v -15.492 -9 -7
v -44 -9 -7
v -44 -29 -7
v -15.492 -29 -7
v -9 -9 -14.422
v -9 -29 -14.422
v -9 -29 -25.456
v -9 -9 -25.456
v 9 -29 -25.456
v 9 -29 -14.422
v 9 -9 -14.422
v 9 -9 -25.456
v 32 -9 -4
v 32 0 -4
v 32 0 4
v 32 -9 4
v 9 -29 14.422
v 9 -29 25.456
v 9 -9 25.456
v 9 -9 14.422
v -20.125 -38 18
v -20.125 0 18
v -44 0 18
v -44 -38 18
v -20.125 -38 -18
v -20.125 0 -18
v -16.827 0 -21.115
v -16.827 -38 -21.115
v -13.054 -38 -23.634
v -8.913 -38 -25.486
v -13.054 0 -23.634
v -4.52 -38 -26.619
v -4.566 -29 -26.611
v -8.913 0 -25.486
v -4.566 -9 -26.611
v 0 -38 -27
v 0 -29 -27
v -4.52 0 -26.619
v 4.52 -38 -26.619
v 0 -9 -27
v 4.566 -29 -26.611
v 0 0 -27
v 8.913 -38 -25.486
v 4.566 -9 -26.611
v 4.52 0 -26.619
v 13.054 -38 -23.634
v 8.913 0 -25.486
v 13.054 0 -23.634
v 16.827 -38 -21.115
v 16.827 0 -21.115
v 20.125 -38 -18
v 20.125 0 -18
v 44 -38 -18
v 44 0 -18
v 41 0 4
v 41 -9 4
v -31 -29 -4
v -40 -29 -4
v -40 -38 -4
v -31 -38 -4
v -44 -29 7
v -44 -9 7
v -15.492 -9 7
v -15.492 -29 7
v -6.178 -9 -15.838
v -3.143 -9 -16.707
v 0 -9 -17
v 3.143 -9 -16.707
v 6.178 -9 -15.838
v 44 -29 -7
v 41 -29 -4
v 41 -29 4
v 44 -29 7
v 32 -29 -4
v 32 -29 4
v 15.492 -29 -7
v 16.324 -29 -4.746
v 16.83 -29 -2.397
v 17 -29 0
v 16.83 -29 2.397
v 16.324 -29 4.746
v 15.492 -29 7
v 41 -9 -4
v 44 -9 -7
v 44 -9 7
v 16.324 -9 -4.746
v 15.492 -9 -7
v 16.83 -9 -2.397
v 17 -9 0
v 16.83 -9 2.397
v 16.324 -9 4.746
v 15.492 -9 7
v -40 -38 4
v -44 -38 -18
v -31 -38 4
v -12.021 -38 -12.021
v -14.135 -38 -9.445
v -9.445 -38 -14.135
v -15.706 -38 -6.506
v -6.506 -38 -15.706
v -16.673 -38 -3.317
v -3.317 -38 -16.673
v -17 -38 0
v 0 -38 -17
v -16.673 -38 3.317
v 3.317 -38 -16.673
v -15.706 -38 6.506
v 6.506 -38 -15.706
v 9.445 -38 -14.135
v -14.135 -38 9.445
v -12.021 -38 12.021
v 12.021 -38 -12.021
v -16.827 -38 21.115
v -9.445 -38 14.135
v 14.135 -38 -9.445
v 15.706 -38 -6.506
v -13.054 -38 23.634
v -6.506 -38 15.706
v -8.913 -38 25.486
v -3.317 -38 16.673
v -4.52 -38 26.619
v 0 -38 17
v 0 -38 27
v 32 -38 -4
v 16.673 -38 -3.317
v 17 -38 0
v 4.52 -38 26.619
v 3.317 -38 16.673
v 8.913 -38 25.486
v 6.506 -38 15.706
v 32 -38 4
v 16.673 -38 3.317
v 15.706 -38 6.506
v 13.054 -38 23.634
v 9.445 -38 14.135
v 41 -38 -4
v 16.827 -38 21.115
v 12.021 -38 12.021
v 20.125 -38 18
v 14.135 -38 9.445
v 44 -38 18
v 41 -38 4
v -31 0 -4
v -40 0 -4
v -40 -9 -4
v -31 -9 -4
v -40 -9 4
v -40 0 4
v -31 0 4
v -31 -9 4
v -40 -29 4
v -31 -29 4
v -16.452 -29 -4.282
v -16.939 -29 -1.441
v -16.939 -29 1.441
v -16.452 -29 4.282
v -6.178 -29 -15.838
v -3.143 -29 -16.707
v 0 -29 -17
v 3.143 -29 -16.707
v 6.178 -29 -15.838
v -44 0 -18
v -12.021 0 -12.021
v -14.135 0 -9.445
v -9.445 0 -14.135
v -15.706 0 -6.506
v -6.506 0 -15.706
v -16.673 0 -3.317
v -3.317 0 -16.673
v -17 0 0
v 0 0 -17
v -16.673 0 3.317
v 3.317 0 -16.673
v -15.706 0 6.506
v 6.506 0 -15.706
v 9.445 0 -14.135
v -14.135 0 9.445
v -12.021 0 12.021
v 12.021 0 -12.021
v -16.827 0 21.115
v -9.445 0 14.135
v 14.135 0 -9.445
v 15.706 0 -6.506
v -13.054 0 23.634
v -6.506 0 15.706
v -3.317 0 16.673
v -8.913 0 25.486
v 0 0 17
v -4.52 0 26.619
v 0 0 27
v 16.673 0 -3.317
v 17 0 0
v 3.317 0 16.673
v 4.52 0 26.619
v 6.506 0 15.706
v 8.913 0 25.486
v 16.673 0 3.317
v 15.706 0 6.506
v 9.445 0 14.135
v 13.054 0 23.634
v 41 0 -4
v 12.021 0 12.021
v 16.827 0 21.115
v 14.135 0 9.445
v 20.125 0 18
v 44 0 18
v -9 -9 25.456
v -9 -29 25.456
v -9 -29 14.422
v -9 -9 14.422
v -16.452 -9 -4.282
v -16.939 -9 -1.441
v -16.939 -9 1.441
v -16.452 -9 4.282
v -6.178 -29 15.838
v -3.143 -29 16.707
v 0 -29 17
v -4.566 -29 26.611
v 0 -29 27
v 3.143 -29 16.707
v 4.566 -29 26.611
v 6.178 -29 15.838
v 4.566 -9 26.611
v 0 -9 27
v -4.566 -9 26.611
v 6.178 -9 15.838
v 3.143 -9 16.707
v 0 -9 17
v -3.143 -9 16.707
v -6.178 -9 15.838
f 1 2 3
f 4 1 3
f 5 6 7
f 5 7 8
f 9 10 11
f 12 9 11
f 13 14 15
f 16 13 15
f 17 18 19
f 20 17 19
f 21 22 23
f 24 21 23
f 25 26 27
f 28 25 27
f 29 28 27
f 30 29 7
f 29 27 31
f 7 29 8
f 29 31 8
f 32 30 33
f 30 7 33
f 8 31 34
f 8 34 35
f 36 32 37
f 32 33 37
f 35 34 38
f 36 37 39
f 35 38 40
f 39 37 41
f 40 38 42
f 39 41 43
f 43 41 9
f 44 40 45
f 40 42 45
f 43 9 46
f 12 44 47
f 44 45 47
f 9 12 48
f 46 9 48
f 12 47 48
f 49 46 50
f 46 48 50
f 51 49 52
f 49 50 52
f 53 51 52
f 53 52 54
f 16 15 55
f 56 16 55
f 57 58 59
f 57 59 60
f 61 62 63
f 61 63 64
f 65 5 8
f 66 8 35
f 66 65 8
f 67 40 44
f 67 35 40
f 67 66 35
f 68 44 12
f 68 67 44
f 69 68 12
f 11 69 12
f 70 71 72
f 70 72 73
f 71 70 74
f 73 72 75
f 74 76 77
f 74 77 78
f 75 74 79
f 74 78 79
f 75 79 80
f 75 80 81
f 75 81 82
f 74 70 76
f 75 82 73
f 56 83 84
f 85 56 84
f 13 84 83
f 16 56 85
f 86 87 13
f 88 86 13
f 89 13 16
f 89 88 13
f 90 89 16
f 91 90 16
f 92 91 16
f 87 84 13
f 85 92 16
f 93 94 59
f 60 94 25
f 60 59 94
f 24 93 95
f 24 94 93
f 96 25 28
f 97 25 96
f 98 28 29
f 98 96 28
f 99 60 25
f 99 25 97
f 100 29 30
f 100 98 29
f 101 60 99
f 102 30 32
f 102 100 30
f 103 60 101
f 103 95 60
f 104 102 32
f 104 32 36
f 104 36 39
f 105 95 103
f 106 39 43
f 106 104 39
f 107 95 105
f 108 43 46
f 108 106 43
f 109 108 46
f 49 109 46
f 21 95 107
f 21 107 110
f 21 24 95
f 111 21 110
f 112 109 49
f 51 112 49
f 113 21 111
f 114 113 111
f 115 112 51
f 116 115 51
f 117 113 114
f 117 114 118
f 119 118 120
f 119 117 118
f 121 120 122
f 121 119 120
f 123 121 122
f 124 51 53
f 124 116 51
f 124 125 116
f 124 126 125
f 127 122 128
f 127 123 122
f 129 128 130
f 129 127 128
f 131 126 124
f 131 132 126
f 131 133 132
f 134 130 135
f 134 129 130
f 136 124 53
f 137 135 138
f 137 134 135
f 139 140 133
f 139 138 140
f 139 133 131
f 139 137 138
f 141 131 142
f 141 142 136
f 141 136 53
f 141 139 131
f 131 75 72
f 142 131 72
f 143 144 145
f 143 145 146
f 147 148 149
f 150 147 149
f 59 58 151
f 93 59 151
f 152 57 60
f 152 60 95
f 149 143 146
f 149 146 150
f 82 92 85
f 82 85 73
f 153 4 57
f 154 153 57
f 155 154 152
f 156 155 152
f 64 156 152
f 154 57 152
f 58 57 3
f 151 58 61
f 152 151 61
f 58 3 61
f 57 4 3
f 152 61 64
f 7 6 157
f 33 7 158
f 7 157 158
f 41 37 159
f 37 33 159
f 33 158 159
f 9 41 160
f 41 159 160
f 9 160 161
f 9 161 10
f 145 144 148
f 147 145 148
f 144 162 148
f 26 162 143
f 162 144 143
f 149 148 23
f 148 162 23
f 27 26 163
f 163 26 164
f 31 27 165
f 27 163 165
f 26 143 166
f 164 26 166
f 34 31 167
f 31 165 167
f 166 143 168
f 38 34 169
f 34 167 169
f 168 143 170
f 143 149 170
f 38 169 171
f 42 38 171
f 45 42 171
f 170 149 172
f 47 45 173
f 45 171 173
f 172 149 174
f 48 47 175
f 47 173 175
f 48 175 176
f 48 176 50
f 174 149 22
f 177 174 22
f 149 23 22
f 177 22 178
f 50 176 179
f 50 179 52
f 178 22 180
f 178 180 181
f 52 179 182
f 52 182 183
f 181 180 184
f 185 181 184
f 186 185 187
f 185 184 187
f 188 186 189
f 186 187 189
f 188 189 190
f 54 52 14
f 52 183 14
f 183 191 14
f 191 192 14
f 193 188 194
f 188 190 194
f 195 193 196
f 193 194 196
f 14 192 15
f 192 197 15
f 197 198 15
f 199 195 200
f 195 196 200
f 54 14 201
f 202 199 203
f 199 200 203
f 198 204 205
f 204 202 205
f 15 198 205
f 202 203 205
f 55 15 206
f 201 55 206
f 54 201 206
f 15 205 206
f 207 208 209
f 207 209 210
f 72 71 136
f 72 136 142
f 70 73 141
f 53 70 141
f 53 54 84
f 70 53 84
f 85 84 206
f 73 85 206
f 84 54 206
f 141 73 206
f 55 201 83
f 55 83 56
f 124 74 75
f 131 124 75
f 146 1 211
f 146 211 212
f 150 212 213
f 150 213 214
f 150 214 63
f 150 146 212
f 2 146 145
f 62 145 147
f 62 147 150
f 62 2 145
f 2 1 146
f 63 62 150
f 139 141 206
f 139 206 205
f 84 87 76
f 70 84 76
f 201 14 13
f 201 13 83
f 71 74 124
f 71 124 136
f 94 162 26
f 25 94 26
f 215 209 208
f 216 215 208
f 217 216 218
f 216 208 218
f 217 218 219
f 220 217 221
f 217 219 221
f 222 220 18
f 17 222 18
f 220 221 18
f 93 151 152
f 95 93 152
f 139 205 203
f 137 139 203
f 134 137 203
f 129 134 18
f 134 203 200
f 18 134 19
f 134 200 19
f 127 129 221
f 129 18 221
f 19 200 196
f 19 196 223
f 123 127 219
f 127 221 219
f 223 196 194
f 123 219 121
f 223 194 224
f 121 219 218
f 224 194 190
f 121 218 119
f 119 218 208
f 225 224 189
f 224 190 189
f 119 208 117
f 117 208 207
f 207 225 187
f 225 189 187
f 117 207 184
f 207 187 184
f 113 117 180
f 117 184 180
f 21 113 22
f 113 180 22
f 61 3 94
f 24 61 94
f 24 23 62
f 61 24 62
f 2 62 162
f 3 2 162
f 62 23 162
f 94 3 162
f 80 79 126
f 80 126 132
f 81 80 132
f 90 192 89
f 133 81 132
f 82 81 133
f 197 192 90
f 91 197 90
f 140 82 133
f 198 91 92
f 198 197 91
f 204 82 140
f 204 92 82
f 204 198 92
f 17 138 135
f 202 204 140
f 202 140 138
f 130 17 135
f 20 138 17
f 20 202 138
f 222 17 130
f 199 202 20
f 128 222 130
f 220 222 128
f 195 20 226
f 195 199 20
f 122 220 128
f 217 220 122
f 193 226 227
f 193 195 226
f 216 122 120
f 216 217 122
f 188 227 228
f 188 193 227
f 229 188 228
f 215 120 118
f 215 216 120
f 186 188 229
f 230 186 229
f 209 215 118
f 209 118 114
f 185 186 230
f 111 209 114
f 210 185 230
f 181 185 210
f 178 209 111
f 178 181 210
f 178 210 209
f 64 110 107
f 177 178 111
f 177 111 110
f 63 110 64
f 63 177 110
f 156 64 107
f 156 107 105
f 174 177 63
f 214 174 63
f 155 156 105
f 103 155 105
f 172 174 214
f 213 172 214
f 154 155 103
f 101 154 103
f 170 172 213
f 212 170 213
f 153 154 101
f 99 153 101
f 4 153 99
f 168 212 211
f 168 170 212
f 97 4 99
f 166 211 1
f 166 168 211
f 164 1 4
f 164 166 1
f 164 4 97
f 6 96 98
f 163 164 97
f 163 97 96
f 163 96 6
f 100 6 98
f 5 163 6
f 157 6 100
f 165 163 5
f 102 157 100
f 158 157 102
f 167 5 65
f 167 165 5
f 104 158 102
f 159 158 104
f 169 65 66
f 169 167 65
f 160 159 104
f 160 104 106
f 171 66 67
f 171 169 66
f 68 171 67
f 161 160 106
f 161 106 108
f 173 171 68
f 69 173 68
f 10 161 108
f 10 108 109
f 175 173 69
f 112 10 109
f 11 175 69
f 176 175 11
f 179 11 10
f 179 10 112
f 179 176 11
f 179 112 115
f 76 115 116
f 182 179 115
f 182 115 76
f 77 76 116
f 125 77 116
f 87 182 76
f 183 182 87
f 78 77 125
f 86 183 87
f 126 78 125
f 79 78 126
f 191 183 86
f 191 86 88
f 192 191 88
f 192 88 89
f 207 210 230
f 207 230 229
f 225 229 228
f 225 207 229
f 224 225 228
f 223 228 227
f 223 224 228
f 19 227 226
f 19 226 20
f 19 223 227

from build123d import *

# Parameters (mm, degrees)
F0_W     = 9
F0_H     = 8
F0_R     = 17
F1_DEPTH = 38
F2_W     = 20
F2_H     = 14
F3_DEPTH = 113.538
F5_W     = 18
F5_H     = 20
F6_DEPTH = 71.628


with BuildPart() as f1:
    # F0 (on Front) → F1 (new body)
    with BuildSketch(Plane.XZ):
        with BuildLine():
            ThreePointArc((-20.1246117975, -18), (-27, 0), (-20.1246117975, 18))
            Line((-20.1246117975, 18), (-44, 18))
            Line((-44, 18), (-44, -18))
            Line((-44, -18), (-20.1246117975, -18))
        make_face()
        with Locations((-35.5, 0)):
            Rectangle(F0_W, F0_H, mode=Mode.SUBTRACT)
        with BuildLine():
            ThreePointArc((20.1246117975, -18), (25.222653692, -9.6341964239), (27, 0))
            ThreePointArc((27, 0), (25.222653692, 9.6341964239), (20.1246117975, 18))
            Line((20.1246117975, 18), (-20.1246117975, 18))
            ThreePointArc((-20.1246117975, 18), (-27, 0), (-20.1246117975, -18))
            Line((-20.1246117975, -18), (20.1246117975, -18))
        make_face()
        Circle(F0_R, mode=Mode.SUBTRACT)
        with BuildLine():
            Line((-20.1246117975, 18), (20.1246117975, 18))
            ThreePointArc((20.1246117975, 18), (0, 27), (-20.1246117975, 18))
        make_face()
        with BuildLine():
            ThreePointArc((20.1246117975, 18), (25.222653692, 9.6341964239), (27, 0))
            ThreePointArc((27, 0), (25.222653692, -9.6341964239), (20.1246117975, -18))
            Line((20.1246117975, -18), (44, -18))
            Line((44, -18), (44, 18))
            Line((44, 18), (20.1246117975, 18))
        make_face()
        with Locations((36.5, 0)):
            Rectangle(F0_W, F0_H, mode=Mode.SUBTRACT)
        with BuildLine():
            ThreePointArc((-20.1246117975, -18), (0, -27), (20.1246117975, -18))
            Line((20.1246117975, -18), (-20.1246117975, -18))
        make_face()
    extrude(amount=F1_DEPTH)

    # F2 (on face) → F3 (cut)
    with BuildSketch(Plane(origin=(-44, 0, 0), x_dir=(0, -1, 0), z_dir=(-1, 0, 0))):
        with Locations((19, 0)):
            Rectangle(F2_W, F2_H)
    extrude(amount=-F3_DEPTH, mode=Mode.SUBTRACT)

    # F5 (on offset) → F6 (cut)
    with BuildSketch(Plane.XY.offset(27)):
        with Locations((0, -19)):
            Rectangle(F5_W, F5_H)
    extrude(amount=-F6_DEPTH, mode=Mode.SUBTRACT)


solid = f1.part
